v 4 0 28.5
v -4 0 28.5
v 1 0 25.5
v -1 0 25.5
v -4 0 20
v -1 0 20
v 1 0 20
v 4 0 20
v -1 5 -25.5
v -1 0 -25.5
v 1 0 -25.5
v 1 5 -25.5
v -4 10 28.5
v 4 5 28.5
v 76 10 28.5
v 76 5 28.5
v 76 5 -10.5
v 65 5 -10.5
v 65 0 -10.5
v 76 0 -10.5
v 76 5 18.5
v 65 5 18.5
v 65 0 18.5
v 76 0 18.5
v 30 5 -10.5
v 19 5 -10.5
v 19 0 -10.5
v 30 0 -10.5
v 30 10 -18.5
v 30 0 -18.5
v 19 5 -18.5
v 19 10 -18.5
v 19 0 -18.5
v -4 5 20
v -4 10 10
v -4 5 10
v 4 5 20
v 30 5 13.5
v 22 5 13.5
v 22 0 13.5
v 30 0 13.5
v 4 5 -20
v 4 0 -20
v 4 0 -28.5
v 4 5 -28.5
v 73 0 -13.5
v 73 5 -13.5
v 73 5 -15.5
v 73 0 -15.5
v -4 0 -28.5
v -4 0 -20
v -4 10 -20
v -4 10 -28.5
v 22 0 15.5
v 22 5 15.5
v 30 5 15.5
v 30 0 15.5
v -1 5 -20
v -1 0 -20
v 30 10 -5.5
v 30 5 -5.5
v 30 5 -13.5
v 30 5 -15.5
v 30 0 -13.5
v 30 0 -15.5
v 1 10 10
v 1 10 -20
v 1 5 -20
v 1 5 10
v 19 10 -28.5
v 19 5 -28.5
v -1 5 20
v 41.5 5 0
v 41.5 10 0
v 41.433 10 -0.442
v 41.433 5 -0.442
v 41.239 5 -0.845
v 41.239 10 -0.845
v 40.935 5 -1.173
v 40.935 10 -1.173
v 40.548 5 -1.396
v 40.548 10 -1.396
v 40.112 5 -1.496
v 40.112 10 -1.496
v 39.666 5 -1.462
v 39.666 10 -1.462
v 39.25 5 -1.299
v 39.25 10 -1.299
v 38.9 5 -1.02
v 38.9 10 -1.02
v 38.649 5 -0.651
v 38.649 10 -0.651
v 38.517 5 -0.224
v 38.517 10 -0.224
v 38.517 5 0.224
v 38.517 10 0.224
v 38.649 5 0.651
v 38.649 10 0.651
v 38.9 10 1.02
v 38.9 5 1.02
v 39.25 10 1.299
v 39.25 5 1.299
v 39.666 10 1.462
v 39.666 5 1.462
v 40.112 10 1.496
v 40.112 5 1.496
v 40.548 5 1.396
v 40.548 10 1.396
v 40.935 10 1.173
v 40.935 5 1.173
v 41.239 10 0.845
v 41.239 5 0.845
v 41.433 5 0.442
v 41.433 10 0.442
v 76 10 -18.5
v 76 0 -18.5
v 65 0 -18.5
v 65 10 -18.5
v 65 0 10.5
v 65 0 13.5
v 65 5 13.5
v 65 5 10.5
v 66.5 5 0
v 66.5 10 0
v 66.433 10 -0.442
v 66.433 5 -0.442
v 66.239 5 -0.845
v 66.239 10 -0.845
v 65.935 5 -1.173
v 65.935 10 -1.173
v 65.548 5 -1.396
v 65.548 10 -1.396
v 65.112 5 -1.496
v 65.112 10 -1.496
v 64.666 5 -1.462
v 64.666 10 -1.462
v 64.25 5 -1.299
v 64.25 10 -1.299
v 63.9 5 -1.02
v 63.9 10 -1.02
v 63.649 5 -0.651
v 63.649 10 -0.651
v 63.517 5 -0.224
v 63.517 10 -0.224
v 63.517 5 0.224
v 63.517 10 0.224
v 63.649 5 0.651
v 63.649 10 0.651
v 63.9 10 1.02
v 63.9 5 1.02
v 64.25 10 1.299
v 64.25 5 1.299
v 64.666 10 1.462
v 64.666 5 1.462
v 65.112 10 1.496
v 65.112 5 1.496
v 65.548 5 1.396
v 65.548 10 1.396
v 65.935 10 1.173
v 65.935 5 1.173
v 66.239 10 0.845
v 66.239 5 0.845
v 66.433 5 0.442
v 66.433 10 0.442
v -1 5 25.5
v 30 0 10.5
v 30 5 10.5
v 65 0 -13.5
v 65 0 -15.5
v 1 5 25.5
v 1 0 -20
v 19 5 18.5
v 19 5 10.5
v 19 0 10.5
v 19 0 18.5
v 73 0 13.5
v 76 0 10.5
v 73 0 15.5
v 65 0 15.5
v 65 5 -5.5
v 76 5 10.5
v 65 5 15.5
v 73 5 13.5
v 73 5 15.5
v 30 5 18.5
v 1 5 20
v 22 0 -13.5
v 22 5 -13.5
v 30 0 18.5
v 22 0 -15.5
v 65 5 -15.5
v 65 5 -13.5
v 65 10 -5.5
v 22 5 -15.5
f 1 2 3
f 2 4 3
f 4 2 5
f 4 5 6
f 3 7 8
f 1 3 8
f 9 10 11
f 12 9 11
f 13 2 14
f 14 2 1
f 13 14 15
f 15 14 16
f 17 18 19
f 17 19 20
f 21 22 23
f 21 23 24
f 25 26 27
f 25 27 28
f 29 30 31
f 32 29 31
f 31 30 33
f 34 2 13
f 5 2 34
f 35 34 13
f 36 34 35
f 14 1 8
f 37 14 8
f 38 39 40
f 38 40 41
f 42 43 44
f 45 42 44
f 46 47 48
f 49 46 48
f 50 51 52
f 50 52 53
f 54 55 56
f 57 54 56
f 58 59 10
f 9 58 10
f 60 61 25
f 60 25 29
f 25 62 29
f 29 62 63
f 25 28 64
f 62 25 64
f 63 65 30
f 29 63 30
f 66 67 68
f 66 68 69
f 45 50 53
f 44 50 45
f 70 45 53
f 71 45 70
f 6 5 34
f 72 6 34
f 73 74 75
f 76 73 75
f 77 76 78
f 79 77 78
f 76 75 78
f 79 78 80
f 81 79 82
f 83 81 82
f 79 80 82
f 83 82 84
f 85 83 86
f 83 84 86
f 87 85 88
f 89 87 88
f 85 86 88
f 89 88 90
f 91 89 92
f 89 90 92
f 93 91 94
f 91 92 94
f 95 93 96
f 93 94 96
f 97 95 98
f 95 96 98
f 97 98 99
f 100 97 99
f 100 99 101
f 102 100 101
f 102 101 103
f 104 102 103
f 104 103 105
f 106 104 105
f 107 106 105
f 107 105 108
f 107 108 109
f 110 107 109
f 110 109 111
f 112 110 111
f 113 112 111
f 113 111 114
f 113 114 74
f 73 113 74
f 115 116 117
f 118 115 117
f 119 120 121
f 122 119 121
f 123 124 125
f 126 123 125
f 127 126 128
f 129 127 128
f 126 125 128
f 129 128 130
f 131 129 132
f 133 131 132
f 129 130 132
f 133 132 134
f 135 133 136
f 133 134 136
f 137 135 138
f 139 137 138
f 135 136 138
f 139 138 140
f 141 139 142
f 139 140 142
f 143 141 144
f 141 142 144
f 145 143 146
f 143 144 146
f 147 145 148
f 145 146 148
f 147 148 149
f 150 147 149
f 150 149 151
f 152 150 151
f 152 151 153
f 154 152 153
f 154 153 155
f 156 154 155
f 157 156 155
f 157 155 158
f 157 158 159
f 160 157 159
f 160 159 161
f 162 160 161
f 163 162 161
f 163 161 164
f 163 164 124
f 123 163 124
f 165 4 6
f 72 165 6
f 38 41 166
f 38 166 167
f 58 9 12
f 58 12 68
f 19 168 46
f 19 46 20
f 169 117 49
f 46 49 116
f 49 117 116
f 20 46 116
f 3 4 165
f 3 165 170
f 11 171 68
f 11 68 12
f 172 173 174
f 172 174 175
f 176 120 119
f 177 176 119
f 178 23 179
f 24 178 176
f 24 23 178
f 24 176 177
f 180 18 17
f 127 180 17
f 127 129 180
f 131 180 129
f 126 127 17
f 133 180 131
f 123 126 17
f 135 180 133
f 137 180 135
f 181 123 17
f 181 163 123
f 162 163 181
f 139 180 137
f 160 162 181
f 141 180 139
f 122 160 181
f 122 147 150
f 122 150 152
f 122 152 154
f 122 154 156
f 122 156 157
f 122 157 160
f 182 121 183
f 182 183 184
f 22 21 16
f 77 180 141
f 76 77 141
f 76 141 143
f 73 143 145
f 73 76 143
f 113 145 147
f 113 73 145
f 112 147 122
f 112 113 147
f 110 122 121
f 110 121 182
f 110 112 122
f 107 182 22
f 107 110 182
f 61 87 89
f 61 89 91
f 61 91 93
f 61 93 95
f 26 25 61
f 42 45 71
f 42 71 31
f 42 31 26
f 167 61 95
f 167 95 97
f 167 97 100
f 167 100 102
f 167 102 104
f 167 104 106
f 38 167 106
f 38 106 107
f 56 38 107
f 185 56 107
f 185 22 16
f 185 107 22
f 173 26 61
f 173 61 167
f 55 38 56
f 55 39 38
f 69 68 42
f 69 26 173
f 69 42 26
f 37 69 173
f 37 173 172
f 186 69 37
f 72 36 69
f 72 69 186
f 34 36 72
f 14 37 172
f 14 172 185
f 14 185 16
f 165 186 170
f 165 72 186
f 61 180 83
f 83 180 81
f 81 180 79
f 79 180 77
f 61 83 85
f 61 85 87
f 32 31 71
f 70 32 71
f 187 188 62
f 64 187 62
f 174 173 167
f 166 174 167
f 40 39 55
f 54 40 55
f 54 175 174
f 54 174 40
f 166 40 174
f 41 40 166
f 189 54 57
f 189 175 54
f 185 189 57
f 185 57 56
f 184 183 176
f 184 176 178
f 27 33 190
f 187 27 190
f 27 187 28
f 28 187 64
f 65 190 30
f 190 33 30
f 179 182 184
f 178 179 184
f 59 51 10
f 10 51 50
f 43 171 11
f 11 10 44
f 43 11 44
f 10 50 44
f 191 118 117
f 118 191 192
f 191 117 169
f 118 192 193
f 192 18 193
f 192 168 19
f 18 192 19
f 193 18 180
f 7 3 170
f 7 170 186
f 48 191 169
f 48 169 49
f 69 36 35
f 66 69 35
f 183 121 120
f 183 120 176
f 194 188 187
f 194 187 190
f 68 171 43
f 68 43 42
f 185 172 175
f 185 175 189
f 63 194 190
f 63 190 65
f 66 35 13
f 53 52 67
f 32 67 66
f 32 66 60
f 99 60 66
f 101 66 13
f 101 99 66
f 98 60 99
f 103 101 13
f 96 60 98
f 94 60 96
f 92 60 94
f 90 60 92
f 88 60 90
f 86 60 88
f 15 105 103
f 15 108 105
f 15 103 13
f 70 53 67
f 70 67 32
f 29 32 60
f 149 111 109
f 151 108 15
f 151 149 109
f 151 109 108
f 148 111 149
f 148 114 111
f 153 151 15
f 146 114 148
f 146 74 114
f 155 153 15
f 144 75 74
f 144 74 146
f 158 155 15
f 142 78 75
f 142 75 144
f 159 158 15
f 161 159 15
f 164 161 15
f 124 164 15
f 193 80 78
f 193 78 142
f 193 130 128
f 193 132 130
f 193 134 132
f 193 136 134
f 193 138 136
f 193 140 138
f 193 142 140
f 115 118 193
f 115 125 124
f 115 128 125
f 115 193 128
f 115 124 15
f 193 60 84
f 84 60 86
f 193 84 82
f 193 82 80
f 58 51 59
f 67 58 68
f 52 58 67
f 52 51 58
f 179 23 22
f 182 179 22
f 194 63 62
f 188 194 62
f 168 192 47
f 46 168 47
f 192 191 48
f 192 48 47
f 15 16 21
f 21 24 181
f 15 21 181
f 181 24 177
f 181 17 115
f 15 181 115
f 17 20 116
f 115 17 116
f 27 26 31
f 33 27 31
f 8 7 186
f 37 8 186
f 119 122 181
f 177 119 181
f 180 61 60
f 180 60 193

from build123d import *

# Parameters (mm, degrees)
SKETCH1_W               = 8
SKETCH1_H               = 57
SKETCH1_W_2             = 2
SKETCH1_H_2             = 51
BOSS_EXTRUDE1_DEPTH     = 5
SKETCH2_W               = 80
SKETCH2_H               = 57
BOSS_EXTRUDE2_DEPTH     = 5
SKETCH3_W               = 40
SKETCH3_H               = 10
CUT_EXTRUDE1_DEPTH      = 8
SKETCH4_W               = 57
SKETCH4_H               = 8
SKETCH4_W_2             = 51
SKETCH4_H_2             = 2
BOSS_EXTRUDE3_DEPTH     = 5
SKETCH5_W               = 35
SKETCH5_H               = 10
CUT_EXTRUDE2_DEPTH      = 8
SKETCH6_W               = 35
SKETCH6_H               = 5
CUT_EXTRUDE3_DEPTH      = 6
CUT_EXTRUDE3_DEPTH_BACK = 6
SKETCH7_W               = 30
SKETCH7_H               = 5
CUT_EXTRUDE5_DEPTH      = 5
SKETCH8_R               = 1.5
CUT_EXTRUDE6_DEPTH      = 1
CUT_EXTRUDE6_DEPTH_BACK = 11


with BuildPart() as part:
    # Sketch1 → Boss-Extrude1 (new body)
    with BuildSketch(Plane(origin=(0, 0, 0), x_dir=(1, 0, 0), z_dir=(0, 1, 0))):
        Rectangle(SKETCH1_W, SKETCH1_H)
        Rectangle(SKETCH1_W_2, SKETCH1_H_2, mode=Mode.SUBTRACT)
    extrude(amount=BOSS_EXTRUDE1_DEPTH)

    # Sketch2 → Boss-Extrude2 (add)
    with BuildSketch(Plane(origin=(0, 5, 0), x_dir=(1, 0, 0), z_dir=(0, 1, 0))):
        with Locations((36, 0)):
            Rectangle(SKETCH2_W, SKETCH2_H)
    extrude(amount=BOSS_EXTRUDE2_DEPTH)

    # Sketch3 → Cut-Extrude1 (cut)
    with BuildSketch(Plane.ZY.offset(4)):
        Rectangle(SKETCH3_W, SKETCH3_H)
    extrude(amount=-CUT_EXTRUDE1_DEPTH, mode=Mode.SUBTRACT)

    # Sketch4 → Boss-Extrude3 (add)
    with BuildSketch(Plane.XZ.offset(-5)):
        with Locations((47.5, 14.5)):
            Rectangle(SKETCH4_W, SKETCH4_H)
        with Locations((47.5, 14.5)):
            Rectangle(SKETCH4_W_2, SKETCH4_H_2, mode=Mode.SUBTRACT)
    boss_extrude3 = extrude(amount=BOSS_EXTRUDE3_DEPTH)

    # Sketch5 → Cut-Extrude2 (cut)
    with BuildSketch(Plane.XY.offset(18.5)):
        with Locations((47.5, 0)):
            Rectangle(SKETCH5_W, SKETCH5_H)
    cut_extrude2 = extrude(amount=-CUT_EXTRUDE2_DEPTH, mode=Mode.SUBTRACT)

    # Mirror2: Boss-Extrude3, Cut-Extrude2 across plane
    add(boss_extrude3.mirror(Plane.XY))
    add(cut_extrude2.mirror(Plane.XY), mode=Mode.SUBTRACT)

    # Sketch6 → Cut-Extrude3 (cut, two sides)
    with BuildSketch(Plane.XZ.offset(-5)) as cut_extrude3_sk:
        Polygon((30, -18.5), (65, -18.5), (65, -15.5), (65, -13.5), (65, -10.5), (30, -10.5), (30, -13.5), (30, -15.5), align=None)
        Polygon((19, -28.5), (76, -28.5), (76, -18.5), (65, -18.5), (30, -18.5), (19, -18.5), align=None)
        with Locations((47.5, -8)):
            Rectangle(SKETCH6_W, SKETCH6_H)
    extrude(amount=CUT_EXTRUDE3_DEPTH, mode=Mode.SUBTRACT)
    extrude(cut_extrude3_sk.sketch, amount=-CUT_EXTRUDE3_DEPTH_BACK, mode=Mode.SUBTRACT)

    # Sketch7 → Cut-Extrude5 (cut)
    with BuildSketch(Plane.ZY.offset(4)):
        with Locations((-5, 7.5)):
            Rectangle(SKETCH7_W, SKETCH7_H)
    extrude(amount=-CUT_EXTRUDE5_DEPTH, mode=Mode.SUBTRACT)

    # Sketch8 → Cut-Extrude6 (cut, two sides)
    with BuildSketch(Plane(origin=(0, 10, 0), x_dir=(1, 0, 0), z_dir=(0, 1, 0))) as cut_extrude6_sk:
        with Locations((65, 0)):
            Circle(SKETCH8_R)
        with Locations((40, 0)):
            Circle(SKETCH8_R)
    extrude(amount=CUT_EXTRUDE6_DEPTH, mode=Mode.SUBTRACT)
    extrude(cut_extrude6_sk.sketch, amount=-CUT_EXTRUDE6_DEPTH_BACK, mode=Mode.SUBTRACT)


solid = part.part
